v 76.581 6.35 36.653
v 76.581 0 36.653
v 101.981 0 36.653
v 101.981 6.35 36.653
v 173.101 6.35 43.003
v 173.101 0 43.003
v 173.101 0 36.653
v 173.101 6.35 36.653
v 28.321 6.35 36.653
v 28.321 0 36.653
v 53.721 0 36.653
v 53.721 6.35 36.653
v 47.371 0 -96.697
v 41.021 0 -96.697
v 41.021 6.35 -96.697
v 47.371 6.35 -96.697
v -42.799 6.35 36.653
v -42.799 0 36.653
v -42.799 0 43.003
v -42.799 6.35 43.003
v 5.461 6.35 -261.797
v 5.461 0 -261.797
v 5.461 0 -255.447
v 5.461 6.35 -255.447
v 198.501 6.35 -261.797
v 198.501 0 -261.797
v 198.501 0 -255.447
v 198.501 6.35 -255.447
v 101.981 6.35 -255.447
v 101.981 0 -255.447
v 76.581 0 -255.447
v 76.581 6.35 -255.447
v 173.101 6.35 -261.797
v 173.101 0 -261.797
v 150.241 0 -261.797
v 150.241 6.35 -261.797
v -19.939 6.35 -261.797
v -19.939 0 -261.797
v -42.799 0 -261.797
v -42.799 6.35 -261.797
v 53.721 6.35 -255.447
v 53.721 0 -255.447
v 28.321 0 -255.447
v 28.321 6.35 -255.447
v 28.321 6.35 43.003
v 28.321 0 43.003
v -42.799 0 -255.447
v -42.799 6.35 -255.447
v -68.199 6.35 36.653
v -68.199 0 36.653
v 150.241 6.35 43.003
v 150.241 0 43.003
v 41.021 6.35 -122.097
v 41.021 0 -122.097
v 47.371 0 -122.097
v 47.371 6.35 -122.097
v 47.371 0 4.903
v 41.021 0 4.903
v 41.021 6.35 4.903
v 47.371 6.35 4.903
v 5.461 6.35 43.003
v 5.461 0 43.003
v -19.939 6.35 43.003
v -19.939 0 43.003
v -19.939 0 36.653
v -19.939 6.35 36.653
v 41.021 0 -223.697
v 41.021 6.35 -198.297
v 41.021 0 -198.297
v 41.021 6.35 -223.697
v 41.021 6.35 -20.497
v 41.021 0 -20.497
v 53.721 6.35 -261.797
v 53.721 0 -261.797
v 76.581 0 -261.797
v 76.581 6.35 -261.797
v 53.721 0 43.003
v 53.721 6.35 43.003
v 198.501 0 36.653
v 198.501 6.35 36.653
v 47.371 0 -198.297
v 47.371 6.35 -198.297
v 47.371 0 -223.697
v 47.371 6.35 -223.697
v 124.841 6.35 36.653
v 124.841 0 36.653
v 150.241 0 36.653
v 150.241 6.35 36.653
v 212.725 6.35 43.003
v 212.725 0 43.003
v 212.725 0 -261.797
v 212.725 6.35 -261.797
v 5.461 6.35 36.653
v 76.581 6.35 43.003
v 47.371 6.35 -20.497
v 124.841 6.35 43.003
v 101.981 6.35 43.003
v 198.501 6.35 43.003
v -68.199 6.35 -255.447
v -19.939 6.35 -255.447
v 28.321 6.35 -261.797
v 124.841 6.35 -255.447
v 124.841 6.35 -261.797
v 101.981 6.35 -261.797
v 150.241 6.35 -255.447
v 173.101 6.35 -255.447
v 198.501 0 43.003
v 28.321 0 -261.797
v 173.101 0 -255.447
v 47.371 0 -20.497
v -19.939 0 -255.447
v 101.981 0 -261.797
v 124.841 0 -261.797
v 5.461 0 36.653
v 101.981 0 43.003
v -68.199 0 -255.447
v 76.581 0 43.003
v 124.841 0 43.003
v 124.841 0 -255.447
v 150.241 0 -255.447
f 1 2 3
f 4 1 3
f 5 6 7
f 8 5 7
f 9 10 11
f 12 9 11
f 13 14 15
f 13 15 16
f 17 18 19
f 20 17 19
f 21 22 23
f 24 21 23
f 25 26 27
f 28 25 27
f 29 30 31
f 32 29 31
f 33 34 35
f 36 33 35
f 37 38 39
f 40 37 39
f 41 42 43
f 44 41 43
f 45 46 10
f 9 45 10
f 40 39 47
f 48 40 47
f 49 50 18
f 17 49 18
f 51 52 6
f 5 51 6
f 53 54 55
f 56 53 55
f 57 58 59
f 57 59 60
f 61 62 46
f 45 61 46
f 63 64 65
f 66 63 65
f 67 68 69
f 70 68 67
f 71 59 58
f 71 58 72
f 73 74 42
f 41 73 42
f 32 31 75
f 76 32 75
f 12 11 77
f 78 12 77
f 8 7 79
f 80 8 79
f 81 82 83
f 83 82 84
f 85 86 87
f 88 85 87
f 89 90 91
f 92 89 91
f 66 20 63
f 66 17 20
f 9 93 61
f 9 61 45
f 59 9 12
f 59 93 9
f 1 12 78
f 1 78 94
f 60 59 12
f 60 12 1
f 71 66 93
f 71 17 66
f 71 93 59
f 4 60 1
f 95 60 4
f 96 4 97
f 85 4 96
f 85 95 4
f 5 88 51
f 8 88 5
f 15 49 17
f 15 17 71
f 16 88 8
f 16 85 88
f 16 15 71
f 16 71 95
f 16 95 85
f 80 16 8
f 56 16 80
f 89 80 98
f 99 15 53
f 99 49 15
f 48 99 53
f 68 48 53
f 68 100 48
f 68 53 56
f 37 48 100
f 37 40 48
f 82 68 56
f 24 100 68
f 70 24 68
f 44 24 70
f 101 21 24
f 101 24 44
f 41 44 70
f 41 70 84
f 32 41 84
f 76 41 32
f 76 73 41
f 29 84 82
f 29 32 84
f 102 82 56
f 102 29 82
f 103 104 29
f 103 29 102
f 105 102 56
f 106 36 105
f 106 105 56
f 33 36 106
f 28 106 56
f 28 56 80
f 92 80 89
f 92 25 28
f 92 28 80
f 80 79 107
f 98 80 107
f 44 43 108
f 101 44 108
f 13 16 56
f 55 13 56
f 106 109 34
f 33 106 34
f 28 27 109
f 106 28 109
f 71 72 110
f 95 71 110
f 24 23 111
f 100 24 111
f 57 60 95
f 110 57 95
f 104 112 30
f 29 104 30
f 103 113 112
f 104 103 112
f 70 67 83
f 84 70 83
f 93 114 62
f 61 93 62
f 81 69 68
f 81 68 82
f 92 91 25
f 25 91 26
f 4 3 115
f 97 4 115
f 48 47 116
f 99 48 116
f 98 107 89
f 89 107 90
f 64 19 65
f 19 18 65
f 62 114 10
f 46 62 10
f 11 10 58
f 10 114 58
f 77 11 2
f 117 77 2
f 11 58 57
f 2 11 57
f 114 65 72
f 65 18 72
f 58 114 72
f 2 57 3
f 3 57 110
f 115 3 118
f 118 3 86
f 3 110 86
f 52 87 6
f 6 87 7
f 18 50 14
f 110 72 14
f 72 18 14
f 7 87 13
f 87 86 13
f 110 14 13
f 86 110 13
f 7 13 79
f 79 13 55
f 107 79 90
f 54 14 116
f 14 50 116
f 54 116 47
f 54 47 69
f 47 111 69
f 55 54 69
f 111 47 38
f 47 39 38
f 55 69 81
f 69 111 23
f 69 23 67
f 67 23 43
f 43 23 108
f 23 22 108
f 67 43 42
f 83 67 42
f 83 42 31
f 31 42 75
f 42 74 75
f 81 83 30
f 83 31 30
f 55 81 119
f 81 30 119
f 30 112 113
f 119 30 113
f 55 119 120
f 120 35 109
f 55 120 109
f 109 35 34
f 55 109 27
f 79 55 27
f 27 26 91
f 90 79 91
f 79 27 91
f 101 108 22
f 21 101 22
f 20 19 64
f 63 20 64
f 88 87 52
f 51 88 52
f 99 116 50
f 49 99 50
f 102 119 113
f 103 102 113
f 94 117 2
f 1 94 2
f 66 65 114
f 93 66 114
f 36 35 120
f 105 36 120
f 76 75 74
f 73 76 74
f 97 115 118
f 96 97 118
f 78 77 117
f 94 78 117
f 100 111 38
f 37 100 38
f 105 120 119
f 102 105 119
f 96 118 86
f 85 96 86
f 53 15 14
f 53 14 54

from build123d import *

# Parameters (mm, degrees)
BOSS_EXTRUDE1_DEPTH = 6.35
SKETCH2_W           = 6.35
SKETCH2_H           = 25.4
CUT_EXTRUDE1_DEPTH  = 338.387086593


with BuildPart() as part:
    # Sketch1 → Boss-Extrude1 (new body)
    with BuildSketch(Plane(origin=(0, 0, 0), x_dir=(1, 0, 0), z_dir=(0, 1, 0))):
        Polygon((-42.798869448, -43.002859963), (-19.938869448, -43.002859963), (-19.938869448, -36.652859963), (5.461130552, -36.652859963), (5.461130552, -43.002859963), (28.321130552, -43.002859963), (28.321130552, -36.652859963), (53.721130552, -36.652859963), (53.721130552, -43.002859963), (76.581130552, -43.002859963), (76.581130552, -36.652859963), (101.981130552, -36.652859963), (101.981130552, -43.002859963), (124.841130552, -43.002859963), (124.841130552, -36.652859963), (150.241130552, -36.652859963), (150.241130552, -43.002859963), (173.101130552, -43.002859963), (173.101130552, -36.652859963), (198.501130552, -36.652859963), (198.501130552, -43.002859963), (212.725130552, -43.002859963), (212.725130552, 261.797140037), (198.501130552, 261.797140037), (198.501130552, 255.447140037), (173.101130552, 255.447140037), (173.101130552, 261.797140037), (150.241130552, 261.797140037), (150.241130552, 255.447140037), (124.841130552, 255.447140037), (124.841130552, 261.797140037), (101.981130552, 261.797140037), (101.981130552, 255.447140037), (76.581130552, 255.447140037), (76.581130552, 261.797140037), (53.721130552, 261.797140037), (53.721130552, 255.447140037), (28.321130552, 255.447140037), (28.321130552, 261.797140037), (5.461130552, 261.797140037), (5.461130552, 255.447140037), (-19.938869448, 255.447140037), (-19.938869448, 261.797140037), (-42.798869448, 261.797140037), (-42.798869448, 255.447140037), (-68.198869448, 255.447140037), (-68.198869448, -36.652859963), (-42.798869448, -36.652859963), align=None)
    extrude(amount=BOSS_EXTRUDE1_DEPTH)

    # Sketch2 → Cut-Extrude1 (cut, through all)
    with BuildSketch(Plane(origin=(0, 6.35, 0), x_dir=(1, 0, 0), z_dir=(0, 1, 0))):
        with Locations((44.196130552, 210.997140037)):
            Rectangle(SKETCH2_W, SKETCH2_H)
        with Locations((44.196130552, 7.797140037)):
            Rectangle(SKETCH2_W, SKETCH2_H)
        with Locations((44.196130552, 109.397140037)):
            Rectangle(SKETCH2_W, SKETCH2_H)
    extrude(amount=-CUT_EXTRUDE1_DEPTH, mode=Mode.SUBTRACT)


solid = part.part
